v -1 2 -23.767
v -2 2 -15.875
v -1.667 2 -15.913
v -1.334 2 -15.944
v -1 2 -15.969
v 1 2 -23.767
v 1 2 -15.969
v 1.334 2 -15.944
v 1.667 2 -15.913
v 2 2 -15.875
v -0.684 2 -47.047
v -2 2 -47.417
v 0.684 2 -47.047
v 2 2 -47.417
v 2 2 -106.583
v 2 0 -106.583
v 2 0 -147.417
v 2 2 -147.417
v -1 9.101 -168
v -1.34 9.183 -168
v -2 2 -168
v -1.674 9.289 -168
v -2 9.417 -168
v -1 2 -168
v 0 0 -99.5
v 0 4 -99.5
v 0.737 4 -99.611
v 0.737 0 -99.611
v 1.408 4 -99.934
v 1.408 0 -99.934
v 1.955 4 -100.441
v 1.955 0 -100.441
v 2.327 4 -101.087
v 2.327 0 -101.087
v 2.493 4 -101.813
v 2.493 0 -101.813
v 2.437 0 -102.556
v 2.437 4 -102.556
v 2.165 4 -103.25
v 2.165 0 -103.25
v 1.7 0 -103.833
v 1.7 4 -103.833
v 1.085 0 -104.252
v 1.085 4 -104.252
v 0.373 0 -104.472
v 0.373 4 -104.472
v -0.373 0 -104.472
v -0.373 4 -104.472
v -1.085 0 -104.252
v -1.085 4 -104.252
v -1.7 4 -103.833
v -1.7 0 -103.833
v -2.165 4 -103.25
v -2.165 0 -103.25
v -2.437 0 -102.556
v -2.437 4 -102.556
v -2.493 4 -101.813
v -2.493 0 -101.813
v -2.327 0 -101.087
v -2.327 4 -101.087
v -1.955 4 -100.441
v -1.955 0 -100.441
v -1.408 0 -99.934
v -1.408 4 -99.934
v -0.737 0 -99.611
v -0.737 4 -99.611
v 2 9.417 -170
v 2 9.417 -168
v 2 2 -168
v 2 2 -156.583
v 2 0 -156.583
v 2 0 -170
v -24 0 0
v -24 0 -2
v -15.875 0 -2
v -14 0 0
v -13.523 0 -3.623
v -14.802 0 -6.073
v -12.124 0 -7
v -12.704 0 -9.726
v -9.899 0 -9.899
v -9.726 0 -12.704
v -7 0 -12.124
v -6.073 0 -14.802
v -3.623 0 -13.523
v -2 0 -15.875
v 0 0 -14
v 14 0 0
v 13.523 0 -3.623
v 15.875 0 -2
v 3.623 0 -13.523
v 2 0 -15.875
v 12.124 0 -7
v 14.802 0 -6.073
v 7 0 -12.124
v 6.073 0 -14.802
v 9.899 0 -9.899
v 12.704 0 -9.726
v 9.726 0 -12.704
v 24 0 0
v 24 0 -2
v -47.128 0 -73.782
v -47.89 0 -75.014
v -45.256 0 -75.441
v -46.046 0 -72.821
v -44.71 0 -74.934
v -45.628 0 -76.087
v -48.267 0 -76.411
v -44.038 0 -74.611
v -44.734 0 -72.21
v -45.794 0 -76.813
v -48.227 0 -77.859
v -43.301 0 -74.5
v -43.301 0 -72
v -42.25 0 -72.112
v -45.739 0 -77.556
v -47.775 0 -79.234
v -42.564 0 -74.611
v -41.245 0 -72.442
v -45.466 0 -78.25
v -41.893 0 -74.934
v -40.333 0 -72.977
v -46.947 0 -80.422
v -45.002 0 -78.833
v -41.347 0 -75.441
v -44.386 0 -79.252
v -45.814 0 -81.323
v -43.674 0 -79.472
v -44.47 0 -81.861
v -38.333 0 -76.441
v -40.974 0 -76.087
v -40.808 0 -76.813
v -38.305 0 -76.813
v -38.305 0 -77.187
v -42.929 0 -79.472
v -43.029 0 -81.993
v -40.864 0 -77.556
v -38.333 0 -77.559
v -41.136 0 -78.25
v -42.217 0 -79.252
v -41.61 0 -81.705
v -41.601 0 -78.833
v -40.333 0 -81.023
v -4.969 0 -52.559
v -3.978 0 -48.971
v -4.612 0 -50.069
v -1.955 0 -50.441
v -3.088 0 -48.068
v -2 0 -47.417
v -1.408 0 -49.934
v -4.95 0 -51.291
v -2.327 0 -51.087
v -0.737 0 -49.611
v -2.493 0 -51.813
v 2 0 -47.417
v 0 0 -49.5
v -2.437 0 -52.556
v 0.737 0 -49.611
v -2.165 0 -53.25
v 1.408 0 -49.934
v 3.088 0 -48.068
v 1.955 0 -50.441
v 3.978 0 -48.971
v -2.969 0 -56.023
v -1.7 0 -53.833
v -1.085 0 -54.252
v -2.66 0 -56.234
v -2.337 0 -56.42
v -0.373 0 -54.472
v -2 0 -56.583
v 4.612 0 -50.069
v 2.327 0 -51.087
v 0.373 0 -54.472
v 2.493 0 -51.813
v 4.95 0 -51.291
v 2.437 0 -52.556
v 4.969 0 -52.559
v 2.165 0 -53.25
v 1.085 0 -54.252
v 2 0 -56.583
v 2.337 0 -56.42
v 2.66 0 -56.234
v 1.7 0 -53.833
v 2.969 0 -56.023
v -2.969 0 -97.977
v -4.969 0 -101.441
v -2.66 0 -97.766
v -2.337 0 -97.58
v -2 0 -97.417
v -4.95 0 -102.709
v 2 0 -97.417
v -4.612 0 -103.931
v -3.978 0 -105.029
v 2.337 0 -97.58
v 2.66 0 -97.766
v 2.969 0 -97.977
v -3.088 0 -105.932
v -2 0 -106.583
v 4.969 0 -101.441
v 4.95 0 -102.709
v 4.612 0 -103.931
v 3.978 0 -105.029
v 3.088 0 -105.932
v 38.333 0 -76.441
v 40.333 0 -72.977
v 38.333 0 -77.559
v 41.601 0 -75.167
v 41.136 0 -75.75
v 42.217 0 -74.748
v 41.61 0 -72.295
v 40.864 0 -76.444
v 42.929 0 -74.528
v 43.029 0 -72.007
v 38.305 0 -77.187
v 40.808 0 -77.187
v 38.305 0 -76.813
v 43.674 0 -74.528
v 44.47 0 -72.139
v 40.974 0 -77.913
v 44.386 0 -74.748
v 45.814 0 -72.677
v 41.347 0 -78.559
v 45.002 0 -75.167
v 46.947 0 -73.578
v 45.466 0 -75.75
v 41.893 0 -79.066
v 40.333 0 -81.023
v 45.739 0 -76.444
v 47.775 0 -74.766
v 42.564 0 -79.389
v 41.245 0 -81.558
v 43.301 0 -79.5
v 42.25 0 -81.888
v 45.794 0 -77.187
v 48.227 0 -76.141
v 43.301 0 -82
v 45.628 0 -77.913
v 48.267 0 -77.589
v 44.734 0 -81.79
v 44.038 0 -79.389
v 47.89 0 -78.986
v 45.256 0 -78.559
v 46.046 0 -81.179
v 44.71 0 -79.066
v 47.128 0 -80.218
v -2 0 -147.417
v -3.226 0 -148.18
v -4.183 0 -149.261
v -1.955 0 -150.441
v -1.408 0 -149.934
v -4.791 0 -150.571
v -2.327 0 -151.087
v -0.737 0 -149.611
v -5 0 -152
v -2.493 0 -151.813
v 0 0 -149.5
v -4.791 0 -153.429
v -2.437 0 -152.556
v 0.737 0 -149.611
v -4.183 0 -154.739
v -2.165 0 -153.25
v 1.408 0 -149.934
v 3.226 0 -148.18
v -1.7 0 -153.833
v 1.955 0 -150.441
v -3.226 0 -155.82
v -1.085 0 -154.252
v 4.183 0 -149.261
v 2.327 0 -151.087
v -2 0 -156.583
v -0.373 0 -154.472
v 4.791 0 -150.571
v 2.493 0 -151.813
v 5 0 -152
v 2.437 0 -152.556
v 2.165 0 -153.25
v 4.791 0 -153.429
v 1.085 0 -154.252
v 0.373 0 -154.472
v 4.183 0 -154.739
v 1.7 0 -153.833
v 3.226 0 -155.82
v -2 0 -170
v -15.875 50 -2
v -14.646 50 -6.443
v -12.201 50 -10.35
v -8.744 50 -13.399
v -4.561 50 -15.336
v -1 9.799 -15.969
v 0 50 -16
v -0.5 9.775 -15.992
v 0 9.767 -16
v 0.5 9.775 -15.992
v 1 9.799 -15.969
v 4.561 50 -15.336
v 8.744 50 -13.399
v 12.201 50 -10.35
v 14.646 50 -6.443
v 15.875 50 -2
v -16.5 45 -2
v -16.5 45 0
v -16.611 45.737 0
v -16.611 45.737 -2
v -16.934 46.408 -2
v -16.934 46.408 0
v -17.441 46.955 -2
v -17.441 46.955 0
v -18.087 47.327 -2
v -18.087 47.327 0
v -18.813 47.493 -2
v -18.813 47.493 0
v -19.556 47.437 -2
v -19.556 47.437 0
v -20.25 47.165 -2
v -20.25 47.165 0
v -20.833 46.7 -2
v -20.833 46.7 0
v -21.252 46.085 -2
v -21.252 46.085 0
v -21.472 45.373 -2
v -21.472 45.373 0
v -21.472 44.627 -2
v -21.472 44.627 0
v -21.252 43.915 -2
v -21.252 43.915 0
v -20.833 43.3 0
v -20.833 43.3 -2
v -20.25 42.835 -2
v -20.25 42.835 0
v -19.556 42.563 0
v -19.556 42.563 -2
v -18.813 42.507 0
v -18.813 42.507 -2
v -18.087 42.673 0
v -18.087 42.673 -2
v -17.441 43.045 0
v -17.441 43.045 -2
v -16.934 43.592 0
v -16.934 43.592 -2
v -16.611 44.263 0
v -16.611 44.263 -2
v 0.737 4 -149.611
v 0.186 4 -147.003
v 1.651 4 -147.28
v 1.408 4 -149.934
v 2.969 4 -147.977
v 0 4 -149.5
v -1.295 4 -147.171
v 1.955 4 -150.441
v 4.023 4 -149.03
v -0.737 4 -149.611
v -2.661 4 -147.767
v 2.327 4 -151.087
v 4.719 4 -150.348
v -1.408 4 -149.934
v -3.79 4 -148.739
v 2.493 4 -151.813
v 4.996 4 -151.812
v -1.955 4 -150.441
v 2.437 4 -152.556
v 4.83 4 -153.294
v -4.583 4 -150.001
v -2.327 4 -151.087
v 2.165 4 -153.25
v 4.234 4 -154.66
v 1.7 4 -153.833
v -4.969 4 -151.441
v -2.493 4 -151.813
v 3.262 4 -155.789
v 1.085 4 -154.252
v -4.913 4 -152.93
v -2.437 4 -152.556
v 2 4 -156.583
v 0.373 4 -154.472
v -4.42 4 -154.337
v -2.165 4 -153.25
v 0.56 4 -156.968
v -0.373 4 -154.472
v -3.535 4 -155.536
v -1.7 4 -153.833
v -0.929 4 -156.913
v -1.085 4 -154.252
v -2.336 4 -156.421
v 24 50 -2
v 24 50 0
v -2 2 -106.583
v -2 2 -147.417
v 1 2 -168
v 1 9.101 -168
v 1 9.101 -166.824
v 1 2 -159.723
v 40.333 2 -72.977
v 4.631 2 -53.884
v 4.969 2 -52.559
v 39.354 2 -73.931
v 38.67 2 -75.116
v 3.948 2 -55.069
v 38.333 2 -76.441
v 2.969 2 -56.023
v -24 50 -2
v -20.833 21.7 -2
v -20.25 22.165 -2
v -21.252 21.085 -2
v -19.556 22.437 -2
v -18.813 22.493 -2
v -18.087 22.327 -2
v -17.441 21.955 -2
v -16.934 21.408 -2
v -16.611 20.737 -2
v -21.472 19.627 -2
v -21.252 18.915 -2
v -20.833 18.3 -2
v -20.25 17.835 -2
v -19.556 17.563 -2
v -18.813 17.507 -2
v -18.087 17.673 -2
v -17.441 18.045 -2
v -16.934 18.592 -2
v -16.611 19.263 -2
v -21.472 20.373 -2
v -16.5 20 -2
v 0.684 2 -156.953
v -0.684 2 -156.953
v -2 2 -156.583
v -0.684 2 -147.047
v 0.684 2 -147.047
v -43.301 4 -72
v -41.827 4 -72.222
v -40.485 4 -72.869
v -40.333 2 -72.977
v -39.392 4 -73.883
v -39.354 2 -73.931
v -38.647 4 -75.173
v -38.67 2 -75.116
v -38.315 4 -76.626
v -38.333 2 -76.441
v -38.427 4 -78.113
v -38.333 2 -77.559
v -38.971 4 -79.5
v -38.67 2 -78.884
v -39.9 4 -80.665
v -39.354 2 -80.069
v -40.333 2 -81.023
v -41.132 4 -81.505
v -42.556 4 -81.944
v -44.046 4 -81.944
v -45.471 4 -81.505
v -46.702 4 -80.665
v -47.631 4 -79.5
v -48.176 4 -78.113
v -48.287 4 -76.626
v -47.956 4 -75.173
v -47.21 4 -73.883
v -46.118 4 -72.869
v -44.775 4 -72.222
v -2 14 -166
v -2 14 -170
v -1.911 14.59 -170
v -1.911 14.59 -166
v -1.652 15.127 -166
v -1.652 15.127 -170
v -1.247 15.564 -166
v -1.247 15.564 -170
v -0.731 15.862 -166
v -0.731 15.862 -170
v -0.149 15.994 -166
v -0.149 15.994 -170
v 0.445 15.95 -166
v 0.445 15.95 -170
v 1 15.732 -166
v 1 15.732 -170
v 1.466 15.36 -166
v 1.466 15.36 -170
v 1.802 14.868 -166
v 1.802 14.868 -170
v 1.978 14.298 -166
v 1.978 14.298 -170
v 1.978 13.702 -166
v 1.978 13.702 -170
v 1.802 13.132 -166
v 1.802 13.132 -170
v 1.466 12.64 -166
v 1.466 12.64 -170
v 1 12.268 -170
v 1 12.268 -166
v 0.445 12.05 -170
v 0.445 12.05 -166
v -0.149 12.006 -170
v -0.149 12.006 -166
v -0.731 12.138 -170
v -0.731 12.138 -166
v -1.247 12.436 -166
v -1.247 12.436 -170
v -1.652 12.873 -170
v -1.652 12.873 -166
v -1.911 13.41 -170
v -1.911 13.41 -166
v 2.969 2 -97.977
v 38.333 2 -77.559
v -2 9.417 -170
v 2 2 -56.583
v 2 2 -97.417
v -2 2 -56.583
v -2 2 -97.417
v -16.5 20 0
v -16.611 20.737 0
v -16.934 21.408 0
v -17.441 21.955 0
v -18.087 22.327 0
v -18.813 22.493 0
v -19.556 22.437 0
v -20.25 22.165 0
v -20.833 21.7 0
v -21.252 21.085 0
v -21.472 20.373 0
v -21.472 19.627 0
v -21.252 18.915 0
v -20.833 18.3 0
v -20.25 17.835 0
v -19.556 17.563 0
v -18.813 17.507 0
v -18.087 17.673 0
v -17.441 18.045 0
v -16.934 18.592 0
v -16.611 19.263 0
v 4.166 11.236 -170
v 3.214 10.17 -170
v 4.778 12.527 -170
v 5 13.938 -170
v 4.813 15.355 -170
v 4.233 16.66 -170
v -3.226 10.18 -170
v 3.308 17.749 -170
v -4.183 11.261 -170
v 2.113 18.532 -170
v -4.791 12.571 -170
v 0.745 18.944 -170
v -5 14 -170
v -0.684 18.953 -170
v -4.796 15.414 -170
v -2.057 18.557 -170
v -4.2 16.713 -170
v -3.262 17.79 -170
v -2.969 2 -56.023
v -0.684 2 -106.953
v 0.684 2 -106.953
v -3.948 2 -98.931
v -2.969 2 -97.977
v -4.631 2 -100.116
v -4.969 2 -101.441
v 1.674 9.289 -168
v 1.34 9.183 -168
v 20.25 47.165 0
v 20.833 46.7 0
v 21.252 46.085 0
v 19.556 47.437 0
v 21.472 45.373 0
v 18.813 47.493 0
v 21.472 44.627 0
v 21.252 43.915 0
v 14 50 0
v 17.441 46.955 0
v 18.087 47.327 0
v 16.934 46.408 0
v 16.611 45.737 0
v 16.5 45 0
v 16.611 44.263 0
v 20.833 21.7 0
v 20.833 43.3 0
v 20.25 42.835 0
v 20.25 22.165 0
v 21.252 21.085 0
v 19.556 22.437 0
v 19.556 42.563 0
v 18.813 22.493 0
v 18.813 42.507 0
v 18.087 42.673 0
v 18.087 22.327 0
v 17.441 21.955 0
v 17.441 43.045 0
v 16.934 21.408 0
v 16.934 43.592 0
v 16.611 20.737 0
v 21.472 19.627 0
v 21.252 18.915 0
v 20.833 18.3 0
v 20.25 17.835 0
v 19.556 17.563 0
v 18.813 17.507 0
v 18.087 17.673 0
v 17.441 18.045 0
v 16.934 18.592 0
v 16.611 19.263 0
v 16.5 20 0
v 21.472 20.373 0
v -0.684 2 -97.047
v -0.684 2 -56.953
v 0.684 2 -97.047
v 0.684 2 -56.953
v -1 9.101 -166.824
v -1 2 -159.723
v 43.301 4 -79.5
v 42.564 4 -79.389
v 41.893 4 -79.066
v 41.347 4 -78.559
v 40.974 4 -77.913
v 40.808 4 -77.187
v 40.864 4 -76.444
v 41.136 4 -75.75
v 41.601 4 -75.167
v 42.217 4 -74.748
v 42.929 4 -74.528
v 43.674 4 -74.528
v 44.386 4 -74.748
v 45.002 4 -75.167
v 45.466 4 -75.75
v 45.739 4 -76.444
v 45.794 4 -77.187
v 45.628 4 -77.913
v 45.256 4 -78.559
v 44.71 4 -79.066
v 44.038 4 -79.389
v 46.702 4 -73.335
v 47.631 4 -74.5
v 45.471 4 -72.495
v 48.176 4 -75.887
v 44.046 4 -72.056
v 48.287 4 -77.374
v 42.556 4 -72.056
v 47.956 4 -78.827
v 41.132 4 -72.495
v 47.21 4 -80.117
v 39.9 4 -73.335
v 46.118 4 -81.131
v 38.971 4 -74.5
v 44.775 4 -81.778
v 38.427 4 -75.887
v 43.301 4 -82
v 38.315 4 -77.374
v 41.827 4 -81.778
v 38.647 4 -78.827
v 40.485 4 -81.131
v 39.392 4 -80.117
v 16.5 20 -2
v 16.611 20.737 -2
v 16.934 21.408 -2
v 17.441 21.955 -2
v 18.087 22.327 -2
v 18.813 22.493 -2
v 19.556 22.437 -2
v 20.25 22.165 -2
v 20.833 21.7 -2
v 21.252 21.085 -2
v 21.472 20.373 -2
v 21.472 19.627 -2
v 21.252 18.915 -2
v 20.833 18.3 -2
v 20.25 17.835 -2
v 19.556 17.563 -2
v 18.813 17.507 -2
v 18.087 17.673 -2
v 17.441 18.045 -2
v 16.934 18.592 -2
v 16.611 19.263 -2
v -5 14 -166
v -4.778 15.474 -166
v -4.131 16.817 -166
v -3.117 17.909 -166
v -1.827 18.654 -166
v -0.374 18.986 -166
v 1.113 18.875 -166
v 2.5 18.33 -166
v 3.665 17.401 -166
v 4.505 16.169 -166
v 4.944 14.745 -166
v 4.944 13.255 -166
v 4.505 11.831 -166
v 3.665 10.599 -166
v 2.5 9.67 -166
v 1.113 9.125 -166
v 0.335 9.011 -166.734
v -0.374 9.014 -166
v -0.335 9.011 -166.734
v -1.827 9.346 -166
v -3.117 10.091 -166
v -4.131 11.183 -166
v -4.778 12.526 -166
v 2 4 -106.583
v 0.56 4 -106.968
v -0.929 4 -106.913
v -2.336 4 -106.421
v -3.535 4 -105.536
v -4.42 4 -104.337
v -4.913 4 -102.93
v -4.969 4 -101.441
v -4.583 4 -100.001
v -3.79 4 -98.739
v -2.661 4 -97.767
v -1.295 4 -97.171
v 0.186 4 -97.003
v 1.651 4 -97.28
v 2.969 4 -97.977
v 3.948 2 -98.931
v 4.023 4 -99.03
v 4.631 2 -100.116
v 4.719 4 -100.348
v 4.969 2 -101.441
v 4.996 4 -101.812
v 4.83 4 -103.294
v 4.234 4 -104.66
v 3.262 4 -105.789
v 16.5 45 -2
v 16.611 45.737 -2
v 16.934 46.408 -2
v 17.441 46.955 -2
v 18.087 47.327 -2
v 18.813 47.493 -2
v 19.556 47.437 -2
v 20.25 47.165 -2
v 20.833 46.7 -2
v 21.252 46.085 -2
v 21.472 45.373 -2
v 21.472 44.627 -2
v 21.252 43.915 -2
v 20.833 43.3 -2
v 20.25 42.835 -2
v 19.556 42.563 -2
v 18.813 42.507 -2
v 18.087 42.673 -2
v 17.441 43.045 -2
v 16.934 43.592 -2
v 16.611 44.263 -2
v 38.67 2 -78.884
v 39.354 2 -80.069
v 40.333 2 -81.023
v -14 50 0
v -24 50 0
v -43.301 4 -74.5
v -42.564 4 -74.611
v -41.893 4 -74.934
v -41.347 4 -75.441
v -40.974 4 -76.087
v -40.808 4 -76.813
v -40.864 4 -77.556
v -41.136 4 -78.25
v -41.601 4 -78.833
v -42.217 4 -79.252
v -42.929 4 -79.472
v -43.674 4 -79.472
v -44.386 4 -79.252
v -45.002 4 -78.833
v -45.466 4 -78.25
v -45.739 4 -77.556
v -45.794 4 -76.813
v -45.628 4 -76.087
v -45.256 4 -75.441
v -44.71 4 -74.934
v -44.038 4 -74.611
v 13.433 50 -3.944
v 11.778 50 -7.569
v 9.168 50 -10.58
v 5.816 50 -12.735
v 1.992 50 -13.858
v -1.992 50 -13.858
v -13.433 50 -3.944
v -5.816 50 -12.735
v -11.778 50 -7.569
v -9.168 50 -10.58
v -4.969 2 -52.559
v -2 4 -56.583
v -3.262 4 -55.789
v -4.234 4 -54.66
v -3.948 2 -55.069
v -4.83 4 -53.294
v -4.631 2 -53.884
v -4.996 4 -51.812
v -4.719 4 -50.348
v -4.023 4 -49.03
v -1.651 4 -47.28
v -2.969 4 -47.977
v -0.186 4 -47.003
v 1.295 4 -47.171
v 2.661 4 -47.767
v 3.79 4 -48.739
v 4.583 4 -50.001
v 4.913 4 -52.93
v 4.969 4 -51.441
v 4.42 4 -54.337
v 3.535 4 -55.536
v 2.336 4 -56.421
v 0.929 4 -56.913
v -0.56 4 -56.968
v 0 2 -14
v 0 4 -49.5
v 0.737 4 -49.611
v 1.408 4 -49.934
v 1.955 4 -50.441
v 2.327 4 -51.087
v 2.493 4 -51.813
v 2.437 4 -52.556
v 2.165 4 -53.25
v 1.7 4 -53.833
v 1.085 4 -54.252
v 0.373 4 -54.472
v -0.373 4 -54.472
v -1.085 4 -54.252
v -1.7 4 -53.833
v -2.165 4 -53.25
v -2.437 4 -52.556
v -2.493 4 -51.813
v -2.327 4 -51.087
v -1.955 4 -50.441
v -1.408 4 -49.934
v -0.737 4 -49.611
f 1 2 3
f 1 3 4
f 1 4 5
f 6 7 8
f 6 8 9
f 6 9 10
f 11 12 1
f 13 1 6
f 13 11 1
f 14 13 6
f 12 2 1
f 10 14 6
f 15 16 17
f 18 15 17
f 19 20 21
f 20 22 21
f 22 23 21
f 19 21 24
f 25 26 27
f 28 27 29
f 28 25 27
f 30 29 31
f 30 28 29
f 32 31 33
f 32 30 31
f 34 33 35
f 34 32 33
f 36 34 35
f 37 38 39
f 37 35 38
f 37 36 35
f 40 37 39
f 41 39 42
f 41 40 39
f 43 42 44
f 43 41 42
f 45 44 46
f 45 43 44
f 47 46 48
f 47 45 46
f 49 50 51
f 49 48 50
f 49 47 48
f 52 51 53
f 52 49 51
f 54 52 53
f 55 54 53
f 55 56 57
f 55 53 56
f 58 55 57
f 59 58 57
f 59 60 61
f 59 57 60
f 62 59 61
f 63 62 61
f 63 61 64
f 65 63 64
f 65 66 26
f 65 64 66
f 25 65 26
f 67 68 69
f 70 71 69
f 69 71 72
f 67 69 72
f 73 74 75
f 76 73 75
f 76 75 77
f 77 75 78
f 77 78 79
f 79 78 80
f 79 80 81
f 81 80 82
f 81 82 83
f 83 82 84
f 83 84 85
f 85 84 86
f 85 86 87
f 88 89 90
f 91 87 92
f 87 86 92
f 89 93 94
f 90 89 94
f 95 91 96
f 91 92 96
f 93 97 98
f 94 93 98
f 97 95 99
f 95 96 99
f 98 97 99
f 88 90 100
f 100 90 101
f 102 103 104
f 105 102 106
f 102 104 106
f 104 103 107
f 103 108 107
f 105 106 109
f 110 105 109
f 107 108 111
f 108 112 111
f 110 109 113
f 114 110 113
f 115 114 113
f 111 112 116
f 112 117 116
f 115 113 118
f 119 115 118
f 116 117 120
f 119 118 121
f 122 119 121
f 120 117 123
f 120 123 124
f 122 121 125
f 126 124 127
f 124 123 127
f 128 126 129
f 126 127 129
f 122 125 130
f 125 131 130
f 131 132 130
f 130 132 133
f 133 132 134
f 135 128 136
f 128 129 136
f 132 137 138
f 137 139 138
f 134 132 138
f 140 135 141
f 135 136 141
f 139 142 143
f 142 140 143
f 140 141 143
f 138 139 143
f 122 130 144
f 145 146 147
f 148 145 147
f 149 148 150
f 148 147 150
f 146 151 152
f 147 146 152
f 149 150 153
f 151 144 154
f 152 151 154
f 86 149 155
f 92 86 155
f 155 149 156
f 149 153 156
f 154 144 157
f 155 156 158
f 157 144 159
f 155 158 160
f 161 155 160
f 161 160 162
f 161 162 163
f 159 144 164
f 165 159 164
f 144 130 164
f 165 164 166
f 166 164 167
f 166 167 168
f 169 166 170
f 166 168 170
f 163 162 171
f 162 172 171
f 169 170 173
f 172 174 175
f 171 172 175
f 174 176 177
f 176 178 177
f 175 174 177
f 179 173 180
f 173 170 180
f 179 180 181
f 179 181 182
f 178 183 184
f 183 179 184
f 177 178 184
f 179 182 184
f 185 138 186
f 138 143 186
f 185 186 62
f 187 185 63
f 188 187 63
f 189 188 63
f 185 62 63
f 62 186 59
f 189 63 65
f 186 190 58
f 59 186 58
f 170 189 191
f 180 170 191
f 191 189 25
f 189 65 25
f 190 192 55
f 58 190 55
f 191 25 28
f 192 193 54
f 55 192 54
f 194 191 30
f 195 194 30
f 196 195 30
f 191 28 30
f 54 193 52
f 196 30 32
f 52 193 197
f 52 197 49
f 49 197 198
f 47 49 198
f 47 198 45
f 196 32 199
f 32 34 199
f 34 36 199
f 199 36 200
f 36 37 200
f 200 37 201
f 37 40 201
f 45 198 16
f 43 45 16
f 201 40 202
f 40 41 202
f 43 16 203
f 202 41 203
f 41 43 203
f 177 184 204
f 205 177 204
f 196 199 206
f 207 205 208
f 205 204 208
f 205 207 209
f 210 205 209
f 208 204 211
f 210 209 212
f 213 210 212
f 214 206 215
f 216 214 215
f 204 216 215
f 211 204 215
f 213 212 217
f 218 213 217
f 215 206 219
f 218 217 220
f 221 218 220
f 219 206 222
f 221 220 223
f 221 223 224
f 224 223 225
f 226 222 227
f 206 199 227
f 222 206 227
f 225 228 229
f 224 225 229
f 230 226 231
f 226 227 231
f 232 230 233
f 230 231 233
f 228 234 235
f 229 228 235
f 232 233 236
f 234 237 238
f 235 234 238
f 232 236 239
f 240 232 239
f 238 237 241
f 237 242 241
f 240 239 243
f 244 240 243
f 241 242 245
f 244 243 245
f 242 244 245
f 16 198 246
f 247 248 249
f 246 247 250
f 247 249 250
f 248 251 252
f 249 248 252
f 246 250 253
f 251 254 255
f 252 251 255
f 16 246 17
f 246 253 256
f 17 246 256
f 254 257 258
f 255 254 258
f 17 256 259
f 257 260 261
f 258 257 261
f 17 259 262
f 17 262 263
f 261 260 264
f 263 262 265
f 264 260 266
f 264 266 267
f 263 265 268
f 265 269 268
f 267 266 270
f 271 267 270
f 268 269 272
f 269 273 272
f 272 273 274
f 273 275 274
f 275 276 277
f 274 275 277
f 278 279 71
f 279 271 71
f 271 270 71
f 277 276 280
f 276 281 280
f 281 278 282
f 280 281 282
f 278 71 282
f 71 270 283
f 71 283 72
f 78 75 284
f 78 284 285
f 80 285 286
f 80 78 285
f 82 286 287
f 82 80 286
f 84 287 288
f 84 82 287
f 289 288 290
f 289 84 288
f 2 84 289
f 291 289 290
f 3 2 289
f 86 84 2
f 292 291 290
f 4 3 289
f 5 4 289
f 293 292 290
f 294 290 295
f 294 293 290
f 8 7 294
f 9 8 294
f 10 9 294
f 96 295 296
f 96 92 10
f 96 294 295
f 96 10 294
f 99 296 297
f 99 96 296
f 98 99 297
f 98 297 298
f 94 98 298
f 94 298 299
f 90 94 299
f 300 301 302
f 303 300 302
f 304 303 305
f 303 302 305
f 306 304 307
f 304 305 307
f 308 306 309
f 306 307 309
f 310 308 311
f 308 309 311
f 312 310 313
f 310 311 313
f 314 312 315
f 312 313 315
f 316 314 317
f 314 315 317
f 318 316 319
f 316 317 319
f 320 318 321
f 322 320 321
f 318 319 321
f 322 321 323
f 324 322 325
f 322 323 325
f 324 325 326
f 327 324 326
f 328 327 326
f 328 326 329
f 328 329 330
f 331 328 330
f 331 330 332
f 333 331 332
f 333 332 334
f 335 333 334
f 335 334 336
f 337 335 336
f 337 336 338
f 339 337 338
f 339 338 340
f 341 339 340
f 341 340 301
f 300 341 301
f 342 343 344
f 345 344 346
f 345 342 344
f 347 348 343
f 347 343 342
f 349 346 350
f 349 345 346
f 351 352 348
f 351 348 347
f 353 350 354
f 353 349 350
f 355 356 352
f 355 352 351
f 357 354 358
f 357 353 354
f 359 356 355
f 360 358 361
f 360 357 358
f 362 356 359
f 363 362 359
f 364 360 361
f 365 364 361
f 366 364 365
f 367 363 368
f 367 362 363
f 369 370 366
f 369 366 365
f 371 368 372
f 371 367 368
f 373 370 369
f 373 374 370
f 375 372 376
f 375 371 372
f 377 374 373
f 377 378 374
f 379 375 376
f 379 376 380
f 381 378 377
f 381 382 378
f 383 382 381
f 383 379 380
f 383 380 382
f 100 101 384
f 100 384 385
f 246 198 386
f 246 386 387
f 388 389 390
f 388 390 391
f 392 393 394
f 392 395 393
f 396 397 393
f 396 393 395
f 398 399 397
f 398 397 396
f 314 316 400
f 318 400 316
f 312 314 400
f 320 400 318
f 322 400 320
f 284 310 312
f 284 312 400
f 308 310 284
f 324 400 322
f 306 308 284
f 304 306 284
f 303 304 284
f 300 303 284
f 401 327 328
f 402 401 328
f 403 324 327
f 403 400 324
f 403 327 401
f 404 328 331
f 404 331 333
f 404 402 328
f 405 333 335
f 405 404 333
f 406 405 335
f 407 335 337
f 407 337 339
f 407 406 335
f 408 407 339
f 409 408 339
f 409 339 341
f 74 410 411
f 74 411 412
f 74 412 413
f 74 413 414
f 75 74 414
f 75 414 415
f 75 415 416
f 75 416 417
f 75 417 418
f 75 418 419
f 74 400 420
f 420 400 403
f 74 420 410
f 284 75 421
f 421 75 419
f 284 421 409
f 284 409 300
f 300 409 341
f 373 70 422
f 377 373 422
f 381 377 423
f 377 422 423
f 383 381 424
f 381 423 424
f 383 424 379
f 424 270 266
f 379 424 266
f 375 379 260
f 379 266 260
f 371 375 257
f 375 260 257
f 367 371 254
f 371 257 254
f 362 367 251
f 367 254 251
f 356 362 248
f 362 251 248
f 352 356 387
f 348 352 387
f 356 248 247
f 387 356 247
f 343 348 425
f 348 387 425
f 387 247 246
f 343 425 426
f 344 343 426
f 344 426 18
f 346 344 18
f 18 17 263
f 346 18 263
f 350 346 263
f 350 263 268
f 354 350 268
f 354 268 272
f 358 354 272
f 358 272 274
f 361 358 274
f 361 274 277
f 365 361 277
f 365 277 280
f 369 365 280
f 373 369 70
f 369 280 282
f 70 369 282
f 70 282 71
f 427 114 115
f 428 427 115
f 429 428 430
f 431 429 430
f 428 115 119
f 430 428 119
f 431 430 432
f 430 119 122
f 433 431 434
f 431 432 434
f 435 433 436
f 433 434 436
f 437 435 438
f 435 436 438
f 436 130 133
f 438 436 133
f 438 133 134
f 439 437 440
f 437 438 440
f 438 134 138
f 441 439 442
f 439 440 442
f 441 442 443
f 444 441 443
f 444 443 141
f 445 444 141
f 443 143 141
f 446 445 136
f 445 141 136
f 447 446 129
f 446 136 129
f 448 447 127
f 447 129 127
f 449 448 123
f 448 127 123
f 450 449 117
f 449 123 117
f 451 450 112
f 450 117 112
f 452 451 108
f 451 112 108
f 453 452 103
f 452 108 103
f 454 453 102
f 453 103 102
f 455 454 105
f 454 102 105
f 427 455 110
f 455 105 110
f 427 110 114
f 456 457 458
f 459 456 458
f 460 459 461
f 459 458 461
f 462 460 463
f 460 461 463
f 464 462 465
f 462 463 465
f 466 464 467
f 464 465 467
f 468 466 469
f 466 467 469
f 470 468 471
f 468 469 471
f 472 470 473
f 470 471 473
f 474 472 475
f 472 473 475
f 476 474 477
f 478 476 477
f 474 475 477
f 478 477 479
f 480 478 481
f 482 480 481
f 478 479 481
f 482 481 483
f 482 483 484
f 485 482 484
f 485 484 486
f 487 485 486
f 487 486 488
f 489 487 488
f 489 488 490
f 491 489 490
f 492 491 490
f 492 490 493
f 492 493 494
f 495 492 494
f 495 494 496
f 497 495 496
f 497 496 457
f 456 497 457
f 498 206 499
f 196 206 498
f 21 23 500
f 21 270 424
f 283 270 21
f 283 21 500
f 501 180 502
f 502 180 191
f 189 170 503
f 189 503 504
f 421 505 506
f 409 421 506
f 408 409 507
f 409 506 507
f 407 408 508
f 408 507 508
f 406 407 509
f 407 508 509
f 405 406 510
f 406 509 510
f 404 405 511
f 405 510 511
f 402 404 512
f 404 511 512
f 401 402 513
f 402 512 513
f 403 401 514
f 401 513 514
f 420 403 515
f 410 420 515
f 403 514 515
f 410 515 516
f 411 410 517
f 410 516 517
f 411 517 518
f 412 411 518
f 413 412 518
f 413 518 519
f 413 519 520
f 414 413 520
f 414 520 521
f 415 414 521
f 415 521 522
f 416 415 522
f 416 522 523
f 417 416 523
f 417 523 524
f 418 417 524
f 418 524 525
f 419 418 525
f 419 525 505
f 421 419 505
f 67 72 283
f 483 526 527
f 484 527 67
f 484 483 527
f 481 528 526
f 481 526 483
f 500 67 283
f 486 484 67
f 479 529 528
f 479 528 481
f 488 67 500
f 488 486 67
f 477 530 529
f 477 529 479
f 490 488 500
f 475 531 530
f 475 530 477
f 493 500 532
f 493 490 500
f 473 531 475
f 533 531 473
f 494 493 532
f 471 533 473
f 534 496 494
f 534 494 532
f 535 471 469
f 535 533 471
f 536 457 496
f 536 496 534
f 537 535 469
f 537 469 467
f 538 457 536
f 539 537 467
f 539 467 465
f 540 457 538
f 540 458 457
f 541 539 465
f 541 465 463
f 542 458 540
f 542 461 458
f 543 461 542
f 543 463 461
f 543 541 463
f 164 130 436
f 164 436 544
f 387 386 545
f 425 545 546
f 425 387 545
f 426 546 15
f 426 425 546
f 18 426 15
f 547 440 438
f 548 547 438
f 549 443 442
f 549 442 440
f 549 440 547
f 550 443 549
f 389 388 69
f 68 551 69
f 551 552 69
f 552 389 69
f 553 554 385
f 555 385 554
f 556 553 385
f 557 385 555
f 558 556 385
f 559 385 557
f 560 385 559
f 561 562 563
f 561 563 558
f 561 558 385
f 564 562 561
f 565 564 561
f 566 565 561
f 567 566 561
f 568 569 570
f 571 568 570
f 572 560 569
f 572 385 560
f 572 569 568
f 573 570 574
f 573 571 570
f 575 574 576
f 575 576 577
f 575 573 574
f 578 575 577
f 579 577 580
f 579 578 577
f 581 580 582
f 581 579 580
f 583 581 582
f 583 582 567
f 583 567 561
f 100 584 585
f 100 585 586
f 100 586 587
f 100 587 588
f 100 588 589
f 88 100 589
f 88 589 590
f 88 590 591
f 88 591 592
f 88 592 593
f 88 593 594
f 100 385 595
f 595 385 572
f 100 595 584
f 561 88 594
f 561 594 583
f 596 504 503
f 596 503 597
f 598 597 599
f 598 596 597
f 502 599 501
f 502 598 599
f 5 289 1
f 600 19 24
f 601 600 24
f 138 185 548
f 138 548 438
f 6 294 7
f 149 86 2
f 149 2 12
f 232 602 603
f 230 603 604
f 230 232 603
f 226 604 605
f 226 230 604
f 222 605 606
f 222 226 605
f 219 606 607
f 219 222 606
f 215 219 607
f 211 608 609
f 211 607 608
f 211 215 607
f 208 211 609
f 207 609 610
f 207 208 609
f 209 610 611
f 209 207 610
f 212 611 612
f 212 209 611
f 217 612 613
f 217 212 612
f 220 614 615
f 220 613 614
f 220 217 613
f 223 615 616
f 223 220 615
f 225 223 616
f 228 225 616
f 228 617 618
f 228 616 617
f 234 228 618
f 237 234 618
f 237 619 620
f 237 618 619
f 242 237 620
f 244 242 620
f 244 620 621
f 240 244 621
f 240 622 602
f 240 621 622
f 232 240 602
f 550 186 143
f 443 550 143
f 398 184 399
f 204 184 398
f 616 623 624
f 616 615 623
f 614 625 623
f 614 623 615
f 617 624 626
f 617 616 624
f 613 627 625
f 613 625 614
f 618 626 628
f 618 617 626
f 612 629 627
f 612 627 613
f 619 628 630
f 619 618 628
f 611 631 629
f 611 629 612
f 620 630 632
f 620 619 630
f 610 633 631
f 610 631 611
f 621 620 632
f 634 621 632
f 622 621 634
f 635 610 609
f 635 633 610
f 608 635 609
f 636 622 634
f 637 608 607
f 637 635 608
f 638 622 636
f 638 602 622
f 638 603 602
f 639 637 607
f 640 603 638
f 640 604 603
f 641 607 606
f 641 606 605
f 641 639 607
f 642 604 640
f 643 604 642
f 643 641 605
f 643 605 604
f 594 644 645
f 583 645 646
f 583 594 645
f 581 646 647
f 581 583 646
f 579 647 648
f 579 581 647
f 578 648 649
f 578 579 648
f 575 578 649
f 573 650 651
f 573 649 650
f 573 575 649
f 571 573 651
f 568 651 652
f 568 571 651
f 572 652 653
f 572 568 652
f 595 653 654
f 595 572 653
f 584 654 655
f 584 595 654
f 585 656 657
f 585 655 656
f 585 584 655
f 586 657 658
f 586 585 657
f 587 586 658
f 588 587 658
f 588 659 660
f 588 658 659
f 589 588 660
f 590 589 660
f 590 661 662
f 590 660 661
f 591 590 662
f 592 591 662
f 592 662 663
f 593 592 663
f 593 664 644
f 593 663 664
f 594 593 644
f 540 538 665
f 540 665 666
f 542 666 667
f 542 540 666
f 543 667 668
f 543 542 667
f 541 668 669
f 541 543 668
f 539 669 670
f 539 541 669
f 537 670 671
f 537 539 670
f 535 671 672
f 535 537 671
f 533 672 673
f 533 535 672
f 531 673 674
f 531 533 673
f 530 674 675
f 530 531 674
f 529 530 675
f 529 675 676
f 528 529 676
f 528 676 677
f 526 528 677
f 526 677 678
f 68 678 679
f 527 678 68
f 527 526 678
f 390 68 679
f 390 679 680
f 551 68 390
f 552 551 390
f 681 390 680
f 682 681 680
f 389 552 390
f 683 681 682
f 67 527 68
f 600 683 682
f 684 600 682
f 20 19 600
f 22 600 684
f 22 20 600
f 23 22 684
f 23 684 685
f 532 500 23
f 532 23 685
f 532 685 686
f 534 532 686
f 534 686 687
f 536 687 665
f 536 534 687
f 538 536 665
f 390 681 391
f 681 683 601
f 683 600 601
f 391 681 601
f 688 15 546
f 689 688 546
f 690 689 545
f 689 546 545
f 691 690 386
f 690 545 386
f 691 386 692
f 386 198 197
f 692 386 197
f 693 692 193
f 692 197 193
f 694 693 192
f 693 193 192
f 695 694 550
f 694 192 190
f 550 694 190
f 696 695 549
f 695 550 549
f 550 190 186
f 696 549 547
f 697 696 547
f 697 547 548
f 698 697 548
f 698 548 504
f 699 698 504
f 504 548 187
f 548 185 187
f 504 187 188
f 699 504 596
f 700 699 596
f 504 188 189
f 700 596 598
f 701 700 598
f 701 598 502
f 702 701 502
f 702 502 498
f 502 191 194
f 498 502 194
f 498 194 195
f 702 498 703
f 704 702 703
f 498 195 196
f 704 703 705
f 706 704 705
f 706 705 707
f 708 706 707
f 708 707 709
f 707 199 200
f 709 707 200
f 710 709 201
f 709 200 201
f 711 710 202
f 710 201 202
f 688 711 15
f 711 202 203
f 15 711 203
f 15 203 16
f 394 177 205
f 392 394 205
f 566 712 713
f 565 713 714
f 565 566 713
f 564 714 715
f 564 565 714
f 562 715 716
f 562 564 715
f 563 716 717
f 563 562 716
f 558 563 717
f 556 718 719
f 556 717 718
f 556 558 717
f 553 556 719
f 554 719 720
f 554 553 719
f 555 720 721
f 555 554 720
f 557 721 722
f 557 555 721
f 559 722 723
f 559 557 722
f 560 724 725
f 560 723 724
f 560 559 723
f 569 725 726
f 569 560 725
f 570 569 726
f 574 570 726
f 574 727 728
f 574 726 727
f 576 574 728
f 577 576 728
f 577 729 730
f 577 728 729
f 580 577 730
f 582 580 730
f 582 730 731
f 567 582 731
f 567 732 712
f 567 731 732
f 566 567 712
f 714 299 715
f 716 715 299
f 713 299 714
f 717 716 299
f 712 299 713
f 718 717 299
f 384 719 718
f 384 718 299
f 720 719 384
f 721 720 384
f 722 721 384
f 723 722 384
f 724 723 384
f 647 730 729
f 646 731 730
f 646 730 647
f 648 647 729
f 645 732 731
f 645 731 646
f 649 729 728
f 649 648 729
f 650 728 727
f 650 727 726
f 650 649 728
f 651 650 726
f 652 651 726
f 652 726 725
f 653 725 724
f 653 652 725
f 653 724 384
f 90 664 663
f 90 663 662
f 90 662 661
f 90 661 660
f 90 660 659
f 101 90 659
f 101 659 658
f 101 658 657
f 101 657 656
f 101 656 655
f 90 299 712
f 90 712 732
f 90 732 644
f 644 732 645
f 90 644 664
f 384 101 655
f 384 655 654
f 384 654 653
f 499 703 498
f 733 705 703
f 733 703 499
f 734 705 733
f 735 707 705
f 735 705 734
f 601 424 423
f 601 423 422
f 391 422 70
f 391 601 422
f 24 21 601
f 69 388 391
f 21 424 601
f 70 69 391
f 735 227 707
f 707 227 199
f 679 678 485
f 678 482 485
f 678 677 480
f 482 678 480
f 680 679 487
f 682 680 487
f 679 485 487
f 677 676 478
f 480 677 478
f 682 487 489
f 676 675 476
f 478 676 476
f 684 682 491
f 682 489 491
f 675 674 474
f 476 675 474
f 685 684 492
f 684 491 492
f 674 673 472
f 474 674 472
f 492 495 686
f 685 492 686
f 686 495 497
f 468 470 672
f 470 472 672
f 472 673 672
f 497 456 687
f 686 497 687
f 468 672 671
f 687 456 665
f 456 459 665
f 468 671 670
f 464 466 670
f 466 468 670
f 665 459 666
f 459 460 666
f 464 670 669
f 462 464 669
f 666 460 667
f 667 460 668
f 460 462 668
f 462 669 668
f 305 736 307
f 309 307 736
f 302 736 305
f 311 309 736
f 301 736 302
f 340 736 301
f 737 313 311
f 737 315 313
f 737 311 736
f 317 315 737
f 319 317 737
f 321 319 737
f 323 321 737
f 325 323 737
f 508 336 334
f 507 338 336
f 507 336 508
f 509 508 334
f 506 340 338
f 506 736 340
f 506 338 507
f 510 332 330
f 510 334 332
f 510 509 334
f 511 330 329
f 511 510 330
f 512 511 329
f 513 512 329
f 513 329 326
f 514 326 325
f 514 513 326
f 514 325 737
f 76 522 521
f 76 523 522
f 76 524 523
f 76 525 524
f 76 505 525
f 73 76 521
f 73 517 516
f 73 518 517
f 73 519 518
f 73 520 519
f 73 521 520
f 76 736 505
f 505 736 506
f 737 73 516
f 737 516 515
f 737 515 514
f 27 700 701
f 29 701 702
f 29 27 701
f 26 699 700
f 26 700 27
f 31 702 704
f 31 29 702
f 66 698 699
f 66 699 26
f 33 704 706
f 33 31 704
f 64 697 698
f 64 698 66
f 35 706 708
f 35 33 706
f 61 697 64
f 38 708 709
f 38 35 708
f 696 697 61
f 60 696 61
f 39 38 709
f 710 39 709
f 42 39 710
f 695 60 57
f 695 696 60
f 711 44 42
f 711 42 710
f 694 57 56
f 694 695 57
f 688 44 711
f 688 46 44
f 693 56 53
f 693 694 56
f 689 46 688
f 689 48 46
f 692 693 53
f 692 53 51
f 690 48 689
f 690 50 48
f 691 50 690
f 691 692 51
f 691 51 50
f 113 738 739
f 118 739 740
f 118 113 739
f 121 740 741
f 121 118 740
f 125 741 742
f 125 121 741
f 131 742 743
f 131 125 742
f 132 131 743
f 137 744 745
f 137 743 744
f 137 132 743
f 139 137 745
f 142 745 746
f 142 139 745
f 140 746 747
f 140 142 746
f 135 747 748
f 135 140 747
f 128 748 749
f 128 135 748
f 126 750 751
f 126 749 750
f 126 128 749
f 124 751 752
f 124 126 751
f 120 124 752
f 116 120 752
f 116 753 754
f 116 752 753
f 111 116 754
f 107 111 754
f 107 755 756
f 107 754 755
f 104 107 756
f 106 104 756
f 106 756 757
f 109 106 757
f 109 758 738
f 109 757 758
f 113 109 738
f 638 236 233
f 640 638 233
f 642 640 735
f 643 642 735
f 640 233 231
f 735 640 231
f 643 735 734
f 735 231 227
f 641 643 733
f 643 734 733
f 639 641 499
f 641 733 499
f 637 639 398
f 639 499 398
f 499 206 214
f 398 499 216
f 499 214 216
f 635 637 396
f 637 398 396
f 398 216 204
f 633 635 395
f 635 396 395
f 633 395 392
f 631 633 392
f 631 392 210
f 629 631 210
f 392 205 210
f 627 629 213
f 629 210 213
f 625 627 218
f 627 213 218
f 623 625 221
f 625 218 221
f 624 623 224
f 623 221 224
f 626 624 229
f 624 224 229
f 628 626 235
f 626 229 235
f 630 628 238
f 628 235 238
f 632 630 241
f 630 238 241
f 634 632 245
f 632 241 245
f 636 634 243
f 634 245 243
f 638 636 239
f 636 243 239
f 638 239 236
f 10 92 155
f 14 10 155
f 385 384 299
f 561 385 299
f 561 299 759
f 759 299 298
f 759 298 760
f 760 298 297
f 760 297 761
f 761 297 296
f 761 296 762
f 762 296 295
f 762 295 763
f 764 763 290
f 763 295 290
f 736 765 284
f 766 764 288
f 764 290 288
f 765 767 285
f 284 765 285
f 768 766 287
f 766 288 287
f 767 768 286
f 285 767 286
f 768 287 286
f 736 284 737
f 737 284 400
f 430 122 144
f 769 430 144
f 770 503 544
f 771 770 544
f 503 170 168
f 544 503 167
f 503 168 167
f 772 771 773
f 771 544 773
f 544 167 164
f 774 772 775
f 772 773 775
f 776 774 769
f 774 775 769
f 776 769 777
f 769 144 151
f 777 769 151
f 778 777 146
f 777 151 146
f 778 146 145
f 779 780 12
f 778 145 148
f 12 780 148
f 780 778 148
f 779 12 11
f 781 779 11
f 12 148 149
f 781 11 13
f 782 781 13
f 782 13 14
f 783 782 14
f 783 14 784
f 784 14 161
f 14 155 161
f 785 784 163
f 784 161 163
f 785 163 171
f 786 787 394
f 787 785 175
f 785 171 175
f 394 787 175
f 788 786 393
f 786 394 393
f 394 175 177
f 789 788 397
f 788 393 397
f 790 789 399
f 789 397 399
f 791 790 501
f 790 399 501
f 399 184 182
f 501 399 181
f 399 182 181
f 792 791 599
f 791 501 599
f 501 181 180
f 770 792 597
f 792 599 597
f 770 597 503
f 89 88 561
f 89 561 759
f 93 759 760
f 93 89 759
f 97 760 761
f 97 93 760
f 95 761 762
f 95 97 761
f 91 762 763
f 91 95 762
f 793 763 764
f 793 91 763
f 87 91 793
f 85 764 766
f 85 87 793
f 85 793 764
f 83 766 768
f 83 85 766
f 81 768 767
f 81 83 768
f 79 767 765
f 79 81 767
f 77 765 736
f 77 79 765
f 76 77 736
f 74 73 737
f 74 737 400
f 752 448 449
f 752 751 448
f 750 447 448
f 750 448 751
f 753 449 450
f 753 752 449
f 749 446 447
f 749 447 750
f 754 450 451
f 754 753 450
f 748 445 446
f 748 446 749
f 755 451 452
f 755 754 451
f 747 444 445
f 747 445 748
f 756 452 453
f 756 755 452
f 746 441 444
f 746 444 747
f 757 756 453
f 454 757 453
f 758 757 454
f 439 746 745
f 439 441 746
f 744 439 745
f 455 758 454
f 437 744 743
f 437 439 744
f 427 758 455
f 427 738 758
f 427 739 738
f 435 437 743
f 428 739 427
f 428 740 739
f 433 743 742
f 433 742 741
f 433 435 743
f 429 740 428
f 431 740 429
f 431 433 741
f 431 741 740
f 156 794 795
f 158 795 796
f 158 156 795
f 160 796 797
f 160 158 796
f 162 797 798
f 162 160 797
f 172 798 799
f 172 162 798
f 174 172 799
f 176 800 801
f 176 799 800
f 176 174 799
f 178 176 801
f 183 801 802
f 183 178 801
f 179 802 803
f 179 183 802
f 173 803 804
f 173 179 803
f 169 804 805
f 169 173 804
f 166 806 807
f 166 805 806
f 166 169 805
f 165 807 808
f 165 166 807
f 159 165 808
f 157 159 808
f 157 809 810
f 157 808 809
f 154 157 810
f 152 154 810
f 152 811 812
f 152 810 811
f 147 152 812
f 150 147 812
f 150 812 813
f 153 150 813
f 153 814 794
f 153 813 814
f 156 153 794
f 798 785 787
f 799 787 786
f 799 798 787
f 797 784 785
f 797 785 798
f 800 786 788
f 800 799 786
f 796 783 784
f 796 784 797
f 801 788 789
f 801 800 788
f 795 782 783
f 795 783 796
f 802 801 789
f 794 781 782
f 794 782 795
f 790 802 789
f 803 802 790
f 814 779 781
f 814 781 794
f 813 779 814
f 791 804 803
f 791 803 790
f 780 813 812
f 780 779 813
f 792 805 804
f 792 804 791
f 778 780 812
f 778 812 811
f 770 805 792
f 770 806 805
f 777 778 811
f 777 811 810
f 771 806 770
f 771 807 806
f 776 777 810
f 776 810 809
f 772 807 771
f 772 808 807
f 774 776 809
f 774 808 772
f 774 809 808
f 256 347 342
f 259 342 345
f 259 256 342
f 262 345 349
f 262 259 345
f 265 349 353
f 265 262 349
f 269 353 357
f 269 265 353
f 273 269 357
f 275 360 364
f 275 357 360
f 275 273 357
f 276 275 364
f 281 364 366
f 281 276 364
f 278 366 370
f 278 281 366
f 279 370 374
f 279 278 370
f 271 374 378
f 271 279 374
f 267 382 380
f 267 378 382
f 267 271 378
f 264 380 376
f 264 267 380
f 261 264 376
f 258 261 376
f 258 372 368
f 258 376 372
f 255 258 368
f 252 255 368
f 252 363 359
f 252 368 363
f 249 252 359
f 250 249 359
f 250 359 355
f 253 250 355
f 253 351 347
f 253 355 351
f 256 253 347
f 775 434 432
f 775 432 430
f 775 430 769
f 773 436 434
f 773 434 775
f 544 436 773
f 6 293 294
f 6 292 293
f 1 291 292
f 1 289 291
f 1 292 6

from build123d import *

# Parameters (mm, degrees)
EXTRUDE_1_DEPTH     = 50
SKETCH_2_R          = 2.5
CUT_EXTRUDE_1_DEPTH = 58.723478759
SKETCH_3_W          = 4
SKETCH_3_H          = 154
EXTRUDE_2_DEPTH     = 2
SKETCH_4_R          = 5
EXTRUDE_3_DEPTH     = 4
SKETCH_9_R          = 5
EXTRUDE_7_DEPTH     = 4
EXTRUDE_7_2_DEPTH   = 4
EXTRUDE_8_DEPTH     = 2
SKETCH_5_R          = 2.5
CUT_EXTRUDE_3_DEPTH = 182.815875825
SKETCH_11_W         = 4
SKETCH_11_H         = 2
EXTRUDE_9_DEPTH     = 10
SKETCH_12_R         = 5
EXTRUDE_10_DEPTH    = 4
CUT_EXTRUDE_4_REACH = 185.665
SKETCH_13_R         = 2
RIB_2_REACH         = 185.665
SKETCH_15_WALL_W    = 378.061306134
SKETCH_15_WALL_H    = 2
RIB_7_REACH         = 185.665
SKETCH_16_WALL_W    = 379.053421602
SKETCH_16_WALL_H    = 2


with BuildPart() as part:
    # Эскиз1 → Бобышка-Вытянуть1 (new body)
    with BuildSketch(Plane(origin=(0, 0, 0), x_dir=(1, 0, 0), z_dir=(0, 1, 0))):
        with BuildLine():
            Line((-14, 0), (-24, 0))
            Line((-24, 0), (-24, 2))
            Line((-24, 2), (-15.874507866, 2))
            ThreePointArc((-15.874507866, 2), (0, 16), (15.874507866, 2))
            Line((15.874507866, 2), (24, 2))
            Line((24, 2), (24, 0))
            Line((24, 0), (14, 0))
            ThreePointArc((14, 0), (0, 14), (-14, 0))
        make_face()
    extrude(amount=EXTRUDE_1_DEPTH)

    # Эскиз2 → Вырез-Вытянуть1 (cut, through all)
    with BuildSketch(Plane.XY):
        with Locations((-19, 45)):
            Circle(SKETCH_2_R)
        with Locations((-19, 20)):
            Circle(SKETCH_2_R)
    cut_extrude_1 = extrude(amount=-CUT_EXTRUDE_1_DEPTH, mode=Mode.SUBTRACT)

    # Зеркальное отражение1: Вырез-Вытянуть1 across plane
    add(cut_extrude_1.mirror(Plane(origin=(0, 0, 0), x_dir=(0, 0, 1), z_dir=(1, 0, 0))), mode=Mode.SUBTRACT)

    # Эскиз3 → Бобышка-Вытянуть2 (add)
    with BuildSketch(Plane(origin=(0, 0, 0), x_dir=(1, 0, 0), z_dir=(0, 1, 0))):
        with Locations((0, 91)):
            Rectangle(SKETCH_3_W, SKETCH_3_H)
    extrude(amount=EXTRUDE_2_DEPTH)

    # Эскиз4 → Бобышка-Вытянуть3 (add)
    with BuildSketch(Plane(origin=(0, 0, 0), x_dir=(1, 0, 0), z_dir=(0, 1, 0))):
        with Locations(Location((0, 52, 0), (0, 0, 113.578178478))):
            Circle(SKETCH_4_R)
        with Locations(Location((0, 102, 0), (0, 0, 66.421821522))):
            Circle(SKETCH_4_R)
        with Locations(Location((0, 152, 0), (0, 0, 66.421821522))):
            Circle(SKETCH_4_R)
    extrude(amount=EXTRUDE_3_DEPTH)



with BuildPart() as body_2:
    # Эскиз9 → Бобышка-Вытянуть7 (new body)
    with BuildSketch(Plane(origin=(0, 0, 0), x_dir=(1, 0, 0), z_dir=(0, 1, 0))):
        with Locations(Location((-43.301270189, 77, 0), (0, 0, 270))):
            Circle(SKETCH_9_R)
    extrude(amount=EXTRUDE_7_DEPTH)


with BuildPart() as body_3:
    # Эскиз9 → Extrude 7 2 (new body)
    with BuildSketch(Plane(origin=(0, 0, 0), x_dir=(1, 0, 0), z_dir=(0, 1, 0))):
        with Locations(Location((43.301270189, 77, 0), (0, 0, 90))):
            Circle(SKETCH_9_R)
    extrude(amount=EXTRUDE_7_2_DEPTH)


with BuildPart() as part_1:
    add(part.part)

    add(body_2.part)  # Бобышка-Вытянуть8 merges body 2

    add(body_3.part)  # Бобышка-Вытянуть8 merges body 3
    # Эскиз10 → Бобышка-Вытянуть8 (add)
    with BuildSketch(Plane(origin=(0, 0, 0), x_dir=(1, 0, 0), z_dir=(0, 1, 0))):
        Polygon((0, 104.309401077), (-47.301270189, 77), (0, 49.690598923), (47.301270189, 77), align=None)
        Polygon((0, 99.690598923), (-39.301270189, 77), (0, 54.309401077), (39.301270189, 77), align=None, mode=Mode.SUBTRACT)
    extrude(amount=EXTRUDE_8_DEPTH)

    # Эскиз5 → Вырез-Вытянуть3 (cut, through all)
    with BuildSketch(Plane(origin=(0, 0, 0), x_dir=(1, 0, 0), z_dir=(0, 1, 0))):
        with Locations(Location((0, 102, 0), (0, 0, 270))):
            Circle(SKETCH_5_R)
        with Locations(Location((0, 52, 0), (0, 0, 270))):
            Circle(SKETCH_5_R)
        with Locations(Location((0, 152, 0), (0, 0, 270))):
            Circle(SKETCH_5_R)
        with Locations(Location((-43.301270189, 77, 0), (0, 0, 270))):
            Circle(SKETCH_5_R)
        with Locations(Location((43.301270189, 77, 0), (0, 0, 90))):
            Circle(SKETCH_5_R)
    extrude(amount=CUT_EXTRUDE_3_DEPTH, mode=Mode.SUBTRACT)

    # Эскиз11 → Бобышка-Вытянуть9 (add)
    with BuildSketch(Plane(origin=(0, 0, 0), x_dir=(1, 0, 0), z_dir=(0, 1, 0))):
        with Locations((0, 169)):
            Rectangle(SKETCH_11_W, SKETCH_11_H)
    extrude(amount=EXTRUDE_9_DEPTH)

    # Эскиз12 → Бобышка-Вытянуть10 (add)
    with BuildSketch(Plane(origin=(0, 0, -170), x_dir=(-1, 0, 0), z_dir=(0, 0, -1))):
        with Locations((0, 14)):
            Circle(SKETCH_12_R)
    extrude(amount=-EXTRUDE_10_DEPTH)

    # Эскиз13 → Вырез-Вытянуть4 (cut, up to next)
    with BuildSketch(Plane(origin=(0, 0, -170), x_dir=(-1, 0, 0), z_dir=(0, 0, -1)), mode=Mode.PRIVATE) as cut_extrude_4_sk1:
        with Locations((0, 14)):
            Circle(SKETCH_13_R)
    cut_extrude_4_tool1 = extrude(cut_extrude_4_sk1.sketch, amount=-CUT_EXTRUDE_4_REACH, mode=Mode.PRIVATE) & part_1.part
    add(cut_extrude_4_tool1.solids().sort_by_distance((0, 14, -170))[0], mode=Mode.SUBTRACT)

    # Эскиз15 wall → Ребро2 (add, up to next)
    with BuildSketch(Plane(origin=(0, 5.650617497, -163.373503951), x_dir=(0, -0.707106781187, 0.707106781187), z_dir=(0, -0.707106781187, -0.707106781187)), mode=Mode.PRIVATE) as rib_2_sk1:
        Rectangle(SKETCH_15_WALL_W, SKETCH_15_WALL_H)
    rib_2_tool1 = extrude(rib_2_sk1.sketch, amount=RIB_2_REACH, mode=Mode.PRIVATE) - part_1.part
    add(rib_2_tool1.solids().sort_by_distance((0, 5.650617497, -163.373503951))[0])

    # Эскиз16 wall → Ребро7 (add, up to next)
    with BuildSketch(Plane(origin=(0, 6.071182812, -19.696276491), x_dir=(0, -0.707106781187, -0.707106781187), z_dir=(0, 0.707106781187, -0.707106781187)), mode=Mode.PRIVATE) as rib_7_sk1:
        Rectangle(SKETCH_16_WALL_W, SKETCH_16_WALL_H)
    rib_7_tool1 = extrude(rib_7_sk1.sketch, amount=-RIB_7_REACH, mode=Mode.PRIVATE) - part_1.part
    add(rib_7_tool1.solids().sort_by_distance((0, 6.071182812, -19.696276491))[0])


solid = part_1.part
